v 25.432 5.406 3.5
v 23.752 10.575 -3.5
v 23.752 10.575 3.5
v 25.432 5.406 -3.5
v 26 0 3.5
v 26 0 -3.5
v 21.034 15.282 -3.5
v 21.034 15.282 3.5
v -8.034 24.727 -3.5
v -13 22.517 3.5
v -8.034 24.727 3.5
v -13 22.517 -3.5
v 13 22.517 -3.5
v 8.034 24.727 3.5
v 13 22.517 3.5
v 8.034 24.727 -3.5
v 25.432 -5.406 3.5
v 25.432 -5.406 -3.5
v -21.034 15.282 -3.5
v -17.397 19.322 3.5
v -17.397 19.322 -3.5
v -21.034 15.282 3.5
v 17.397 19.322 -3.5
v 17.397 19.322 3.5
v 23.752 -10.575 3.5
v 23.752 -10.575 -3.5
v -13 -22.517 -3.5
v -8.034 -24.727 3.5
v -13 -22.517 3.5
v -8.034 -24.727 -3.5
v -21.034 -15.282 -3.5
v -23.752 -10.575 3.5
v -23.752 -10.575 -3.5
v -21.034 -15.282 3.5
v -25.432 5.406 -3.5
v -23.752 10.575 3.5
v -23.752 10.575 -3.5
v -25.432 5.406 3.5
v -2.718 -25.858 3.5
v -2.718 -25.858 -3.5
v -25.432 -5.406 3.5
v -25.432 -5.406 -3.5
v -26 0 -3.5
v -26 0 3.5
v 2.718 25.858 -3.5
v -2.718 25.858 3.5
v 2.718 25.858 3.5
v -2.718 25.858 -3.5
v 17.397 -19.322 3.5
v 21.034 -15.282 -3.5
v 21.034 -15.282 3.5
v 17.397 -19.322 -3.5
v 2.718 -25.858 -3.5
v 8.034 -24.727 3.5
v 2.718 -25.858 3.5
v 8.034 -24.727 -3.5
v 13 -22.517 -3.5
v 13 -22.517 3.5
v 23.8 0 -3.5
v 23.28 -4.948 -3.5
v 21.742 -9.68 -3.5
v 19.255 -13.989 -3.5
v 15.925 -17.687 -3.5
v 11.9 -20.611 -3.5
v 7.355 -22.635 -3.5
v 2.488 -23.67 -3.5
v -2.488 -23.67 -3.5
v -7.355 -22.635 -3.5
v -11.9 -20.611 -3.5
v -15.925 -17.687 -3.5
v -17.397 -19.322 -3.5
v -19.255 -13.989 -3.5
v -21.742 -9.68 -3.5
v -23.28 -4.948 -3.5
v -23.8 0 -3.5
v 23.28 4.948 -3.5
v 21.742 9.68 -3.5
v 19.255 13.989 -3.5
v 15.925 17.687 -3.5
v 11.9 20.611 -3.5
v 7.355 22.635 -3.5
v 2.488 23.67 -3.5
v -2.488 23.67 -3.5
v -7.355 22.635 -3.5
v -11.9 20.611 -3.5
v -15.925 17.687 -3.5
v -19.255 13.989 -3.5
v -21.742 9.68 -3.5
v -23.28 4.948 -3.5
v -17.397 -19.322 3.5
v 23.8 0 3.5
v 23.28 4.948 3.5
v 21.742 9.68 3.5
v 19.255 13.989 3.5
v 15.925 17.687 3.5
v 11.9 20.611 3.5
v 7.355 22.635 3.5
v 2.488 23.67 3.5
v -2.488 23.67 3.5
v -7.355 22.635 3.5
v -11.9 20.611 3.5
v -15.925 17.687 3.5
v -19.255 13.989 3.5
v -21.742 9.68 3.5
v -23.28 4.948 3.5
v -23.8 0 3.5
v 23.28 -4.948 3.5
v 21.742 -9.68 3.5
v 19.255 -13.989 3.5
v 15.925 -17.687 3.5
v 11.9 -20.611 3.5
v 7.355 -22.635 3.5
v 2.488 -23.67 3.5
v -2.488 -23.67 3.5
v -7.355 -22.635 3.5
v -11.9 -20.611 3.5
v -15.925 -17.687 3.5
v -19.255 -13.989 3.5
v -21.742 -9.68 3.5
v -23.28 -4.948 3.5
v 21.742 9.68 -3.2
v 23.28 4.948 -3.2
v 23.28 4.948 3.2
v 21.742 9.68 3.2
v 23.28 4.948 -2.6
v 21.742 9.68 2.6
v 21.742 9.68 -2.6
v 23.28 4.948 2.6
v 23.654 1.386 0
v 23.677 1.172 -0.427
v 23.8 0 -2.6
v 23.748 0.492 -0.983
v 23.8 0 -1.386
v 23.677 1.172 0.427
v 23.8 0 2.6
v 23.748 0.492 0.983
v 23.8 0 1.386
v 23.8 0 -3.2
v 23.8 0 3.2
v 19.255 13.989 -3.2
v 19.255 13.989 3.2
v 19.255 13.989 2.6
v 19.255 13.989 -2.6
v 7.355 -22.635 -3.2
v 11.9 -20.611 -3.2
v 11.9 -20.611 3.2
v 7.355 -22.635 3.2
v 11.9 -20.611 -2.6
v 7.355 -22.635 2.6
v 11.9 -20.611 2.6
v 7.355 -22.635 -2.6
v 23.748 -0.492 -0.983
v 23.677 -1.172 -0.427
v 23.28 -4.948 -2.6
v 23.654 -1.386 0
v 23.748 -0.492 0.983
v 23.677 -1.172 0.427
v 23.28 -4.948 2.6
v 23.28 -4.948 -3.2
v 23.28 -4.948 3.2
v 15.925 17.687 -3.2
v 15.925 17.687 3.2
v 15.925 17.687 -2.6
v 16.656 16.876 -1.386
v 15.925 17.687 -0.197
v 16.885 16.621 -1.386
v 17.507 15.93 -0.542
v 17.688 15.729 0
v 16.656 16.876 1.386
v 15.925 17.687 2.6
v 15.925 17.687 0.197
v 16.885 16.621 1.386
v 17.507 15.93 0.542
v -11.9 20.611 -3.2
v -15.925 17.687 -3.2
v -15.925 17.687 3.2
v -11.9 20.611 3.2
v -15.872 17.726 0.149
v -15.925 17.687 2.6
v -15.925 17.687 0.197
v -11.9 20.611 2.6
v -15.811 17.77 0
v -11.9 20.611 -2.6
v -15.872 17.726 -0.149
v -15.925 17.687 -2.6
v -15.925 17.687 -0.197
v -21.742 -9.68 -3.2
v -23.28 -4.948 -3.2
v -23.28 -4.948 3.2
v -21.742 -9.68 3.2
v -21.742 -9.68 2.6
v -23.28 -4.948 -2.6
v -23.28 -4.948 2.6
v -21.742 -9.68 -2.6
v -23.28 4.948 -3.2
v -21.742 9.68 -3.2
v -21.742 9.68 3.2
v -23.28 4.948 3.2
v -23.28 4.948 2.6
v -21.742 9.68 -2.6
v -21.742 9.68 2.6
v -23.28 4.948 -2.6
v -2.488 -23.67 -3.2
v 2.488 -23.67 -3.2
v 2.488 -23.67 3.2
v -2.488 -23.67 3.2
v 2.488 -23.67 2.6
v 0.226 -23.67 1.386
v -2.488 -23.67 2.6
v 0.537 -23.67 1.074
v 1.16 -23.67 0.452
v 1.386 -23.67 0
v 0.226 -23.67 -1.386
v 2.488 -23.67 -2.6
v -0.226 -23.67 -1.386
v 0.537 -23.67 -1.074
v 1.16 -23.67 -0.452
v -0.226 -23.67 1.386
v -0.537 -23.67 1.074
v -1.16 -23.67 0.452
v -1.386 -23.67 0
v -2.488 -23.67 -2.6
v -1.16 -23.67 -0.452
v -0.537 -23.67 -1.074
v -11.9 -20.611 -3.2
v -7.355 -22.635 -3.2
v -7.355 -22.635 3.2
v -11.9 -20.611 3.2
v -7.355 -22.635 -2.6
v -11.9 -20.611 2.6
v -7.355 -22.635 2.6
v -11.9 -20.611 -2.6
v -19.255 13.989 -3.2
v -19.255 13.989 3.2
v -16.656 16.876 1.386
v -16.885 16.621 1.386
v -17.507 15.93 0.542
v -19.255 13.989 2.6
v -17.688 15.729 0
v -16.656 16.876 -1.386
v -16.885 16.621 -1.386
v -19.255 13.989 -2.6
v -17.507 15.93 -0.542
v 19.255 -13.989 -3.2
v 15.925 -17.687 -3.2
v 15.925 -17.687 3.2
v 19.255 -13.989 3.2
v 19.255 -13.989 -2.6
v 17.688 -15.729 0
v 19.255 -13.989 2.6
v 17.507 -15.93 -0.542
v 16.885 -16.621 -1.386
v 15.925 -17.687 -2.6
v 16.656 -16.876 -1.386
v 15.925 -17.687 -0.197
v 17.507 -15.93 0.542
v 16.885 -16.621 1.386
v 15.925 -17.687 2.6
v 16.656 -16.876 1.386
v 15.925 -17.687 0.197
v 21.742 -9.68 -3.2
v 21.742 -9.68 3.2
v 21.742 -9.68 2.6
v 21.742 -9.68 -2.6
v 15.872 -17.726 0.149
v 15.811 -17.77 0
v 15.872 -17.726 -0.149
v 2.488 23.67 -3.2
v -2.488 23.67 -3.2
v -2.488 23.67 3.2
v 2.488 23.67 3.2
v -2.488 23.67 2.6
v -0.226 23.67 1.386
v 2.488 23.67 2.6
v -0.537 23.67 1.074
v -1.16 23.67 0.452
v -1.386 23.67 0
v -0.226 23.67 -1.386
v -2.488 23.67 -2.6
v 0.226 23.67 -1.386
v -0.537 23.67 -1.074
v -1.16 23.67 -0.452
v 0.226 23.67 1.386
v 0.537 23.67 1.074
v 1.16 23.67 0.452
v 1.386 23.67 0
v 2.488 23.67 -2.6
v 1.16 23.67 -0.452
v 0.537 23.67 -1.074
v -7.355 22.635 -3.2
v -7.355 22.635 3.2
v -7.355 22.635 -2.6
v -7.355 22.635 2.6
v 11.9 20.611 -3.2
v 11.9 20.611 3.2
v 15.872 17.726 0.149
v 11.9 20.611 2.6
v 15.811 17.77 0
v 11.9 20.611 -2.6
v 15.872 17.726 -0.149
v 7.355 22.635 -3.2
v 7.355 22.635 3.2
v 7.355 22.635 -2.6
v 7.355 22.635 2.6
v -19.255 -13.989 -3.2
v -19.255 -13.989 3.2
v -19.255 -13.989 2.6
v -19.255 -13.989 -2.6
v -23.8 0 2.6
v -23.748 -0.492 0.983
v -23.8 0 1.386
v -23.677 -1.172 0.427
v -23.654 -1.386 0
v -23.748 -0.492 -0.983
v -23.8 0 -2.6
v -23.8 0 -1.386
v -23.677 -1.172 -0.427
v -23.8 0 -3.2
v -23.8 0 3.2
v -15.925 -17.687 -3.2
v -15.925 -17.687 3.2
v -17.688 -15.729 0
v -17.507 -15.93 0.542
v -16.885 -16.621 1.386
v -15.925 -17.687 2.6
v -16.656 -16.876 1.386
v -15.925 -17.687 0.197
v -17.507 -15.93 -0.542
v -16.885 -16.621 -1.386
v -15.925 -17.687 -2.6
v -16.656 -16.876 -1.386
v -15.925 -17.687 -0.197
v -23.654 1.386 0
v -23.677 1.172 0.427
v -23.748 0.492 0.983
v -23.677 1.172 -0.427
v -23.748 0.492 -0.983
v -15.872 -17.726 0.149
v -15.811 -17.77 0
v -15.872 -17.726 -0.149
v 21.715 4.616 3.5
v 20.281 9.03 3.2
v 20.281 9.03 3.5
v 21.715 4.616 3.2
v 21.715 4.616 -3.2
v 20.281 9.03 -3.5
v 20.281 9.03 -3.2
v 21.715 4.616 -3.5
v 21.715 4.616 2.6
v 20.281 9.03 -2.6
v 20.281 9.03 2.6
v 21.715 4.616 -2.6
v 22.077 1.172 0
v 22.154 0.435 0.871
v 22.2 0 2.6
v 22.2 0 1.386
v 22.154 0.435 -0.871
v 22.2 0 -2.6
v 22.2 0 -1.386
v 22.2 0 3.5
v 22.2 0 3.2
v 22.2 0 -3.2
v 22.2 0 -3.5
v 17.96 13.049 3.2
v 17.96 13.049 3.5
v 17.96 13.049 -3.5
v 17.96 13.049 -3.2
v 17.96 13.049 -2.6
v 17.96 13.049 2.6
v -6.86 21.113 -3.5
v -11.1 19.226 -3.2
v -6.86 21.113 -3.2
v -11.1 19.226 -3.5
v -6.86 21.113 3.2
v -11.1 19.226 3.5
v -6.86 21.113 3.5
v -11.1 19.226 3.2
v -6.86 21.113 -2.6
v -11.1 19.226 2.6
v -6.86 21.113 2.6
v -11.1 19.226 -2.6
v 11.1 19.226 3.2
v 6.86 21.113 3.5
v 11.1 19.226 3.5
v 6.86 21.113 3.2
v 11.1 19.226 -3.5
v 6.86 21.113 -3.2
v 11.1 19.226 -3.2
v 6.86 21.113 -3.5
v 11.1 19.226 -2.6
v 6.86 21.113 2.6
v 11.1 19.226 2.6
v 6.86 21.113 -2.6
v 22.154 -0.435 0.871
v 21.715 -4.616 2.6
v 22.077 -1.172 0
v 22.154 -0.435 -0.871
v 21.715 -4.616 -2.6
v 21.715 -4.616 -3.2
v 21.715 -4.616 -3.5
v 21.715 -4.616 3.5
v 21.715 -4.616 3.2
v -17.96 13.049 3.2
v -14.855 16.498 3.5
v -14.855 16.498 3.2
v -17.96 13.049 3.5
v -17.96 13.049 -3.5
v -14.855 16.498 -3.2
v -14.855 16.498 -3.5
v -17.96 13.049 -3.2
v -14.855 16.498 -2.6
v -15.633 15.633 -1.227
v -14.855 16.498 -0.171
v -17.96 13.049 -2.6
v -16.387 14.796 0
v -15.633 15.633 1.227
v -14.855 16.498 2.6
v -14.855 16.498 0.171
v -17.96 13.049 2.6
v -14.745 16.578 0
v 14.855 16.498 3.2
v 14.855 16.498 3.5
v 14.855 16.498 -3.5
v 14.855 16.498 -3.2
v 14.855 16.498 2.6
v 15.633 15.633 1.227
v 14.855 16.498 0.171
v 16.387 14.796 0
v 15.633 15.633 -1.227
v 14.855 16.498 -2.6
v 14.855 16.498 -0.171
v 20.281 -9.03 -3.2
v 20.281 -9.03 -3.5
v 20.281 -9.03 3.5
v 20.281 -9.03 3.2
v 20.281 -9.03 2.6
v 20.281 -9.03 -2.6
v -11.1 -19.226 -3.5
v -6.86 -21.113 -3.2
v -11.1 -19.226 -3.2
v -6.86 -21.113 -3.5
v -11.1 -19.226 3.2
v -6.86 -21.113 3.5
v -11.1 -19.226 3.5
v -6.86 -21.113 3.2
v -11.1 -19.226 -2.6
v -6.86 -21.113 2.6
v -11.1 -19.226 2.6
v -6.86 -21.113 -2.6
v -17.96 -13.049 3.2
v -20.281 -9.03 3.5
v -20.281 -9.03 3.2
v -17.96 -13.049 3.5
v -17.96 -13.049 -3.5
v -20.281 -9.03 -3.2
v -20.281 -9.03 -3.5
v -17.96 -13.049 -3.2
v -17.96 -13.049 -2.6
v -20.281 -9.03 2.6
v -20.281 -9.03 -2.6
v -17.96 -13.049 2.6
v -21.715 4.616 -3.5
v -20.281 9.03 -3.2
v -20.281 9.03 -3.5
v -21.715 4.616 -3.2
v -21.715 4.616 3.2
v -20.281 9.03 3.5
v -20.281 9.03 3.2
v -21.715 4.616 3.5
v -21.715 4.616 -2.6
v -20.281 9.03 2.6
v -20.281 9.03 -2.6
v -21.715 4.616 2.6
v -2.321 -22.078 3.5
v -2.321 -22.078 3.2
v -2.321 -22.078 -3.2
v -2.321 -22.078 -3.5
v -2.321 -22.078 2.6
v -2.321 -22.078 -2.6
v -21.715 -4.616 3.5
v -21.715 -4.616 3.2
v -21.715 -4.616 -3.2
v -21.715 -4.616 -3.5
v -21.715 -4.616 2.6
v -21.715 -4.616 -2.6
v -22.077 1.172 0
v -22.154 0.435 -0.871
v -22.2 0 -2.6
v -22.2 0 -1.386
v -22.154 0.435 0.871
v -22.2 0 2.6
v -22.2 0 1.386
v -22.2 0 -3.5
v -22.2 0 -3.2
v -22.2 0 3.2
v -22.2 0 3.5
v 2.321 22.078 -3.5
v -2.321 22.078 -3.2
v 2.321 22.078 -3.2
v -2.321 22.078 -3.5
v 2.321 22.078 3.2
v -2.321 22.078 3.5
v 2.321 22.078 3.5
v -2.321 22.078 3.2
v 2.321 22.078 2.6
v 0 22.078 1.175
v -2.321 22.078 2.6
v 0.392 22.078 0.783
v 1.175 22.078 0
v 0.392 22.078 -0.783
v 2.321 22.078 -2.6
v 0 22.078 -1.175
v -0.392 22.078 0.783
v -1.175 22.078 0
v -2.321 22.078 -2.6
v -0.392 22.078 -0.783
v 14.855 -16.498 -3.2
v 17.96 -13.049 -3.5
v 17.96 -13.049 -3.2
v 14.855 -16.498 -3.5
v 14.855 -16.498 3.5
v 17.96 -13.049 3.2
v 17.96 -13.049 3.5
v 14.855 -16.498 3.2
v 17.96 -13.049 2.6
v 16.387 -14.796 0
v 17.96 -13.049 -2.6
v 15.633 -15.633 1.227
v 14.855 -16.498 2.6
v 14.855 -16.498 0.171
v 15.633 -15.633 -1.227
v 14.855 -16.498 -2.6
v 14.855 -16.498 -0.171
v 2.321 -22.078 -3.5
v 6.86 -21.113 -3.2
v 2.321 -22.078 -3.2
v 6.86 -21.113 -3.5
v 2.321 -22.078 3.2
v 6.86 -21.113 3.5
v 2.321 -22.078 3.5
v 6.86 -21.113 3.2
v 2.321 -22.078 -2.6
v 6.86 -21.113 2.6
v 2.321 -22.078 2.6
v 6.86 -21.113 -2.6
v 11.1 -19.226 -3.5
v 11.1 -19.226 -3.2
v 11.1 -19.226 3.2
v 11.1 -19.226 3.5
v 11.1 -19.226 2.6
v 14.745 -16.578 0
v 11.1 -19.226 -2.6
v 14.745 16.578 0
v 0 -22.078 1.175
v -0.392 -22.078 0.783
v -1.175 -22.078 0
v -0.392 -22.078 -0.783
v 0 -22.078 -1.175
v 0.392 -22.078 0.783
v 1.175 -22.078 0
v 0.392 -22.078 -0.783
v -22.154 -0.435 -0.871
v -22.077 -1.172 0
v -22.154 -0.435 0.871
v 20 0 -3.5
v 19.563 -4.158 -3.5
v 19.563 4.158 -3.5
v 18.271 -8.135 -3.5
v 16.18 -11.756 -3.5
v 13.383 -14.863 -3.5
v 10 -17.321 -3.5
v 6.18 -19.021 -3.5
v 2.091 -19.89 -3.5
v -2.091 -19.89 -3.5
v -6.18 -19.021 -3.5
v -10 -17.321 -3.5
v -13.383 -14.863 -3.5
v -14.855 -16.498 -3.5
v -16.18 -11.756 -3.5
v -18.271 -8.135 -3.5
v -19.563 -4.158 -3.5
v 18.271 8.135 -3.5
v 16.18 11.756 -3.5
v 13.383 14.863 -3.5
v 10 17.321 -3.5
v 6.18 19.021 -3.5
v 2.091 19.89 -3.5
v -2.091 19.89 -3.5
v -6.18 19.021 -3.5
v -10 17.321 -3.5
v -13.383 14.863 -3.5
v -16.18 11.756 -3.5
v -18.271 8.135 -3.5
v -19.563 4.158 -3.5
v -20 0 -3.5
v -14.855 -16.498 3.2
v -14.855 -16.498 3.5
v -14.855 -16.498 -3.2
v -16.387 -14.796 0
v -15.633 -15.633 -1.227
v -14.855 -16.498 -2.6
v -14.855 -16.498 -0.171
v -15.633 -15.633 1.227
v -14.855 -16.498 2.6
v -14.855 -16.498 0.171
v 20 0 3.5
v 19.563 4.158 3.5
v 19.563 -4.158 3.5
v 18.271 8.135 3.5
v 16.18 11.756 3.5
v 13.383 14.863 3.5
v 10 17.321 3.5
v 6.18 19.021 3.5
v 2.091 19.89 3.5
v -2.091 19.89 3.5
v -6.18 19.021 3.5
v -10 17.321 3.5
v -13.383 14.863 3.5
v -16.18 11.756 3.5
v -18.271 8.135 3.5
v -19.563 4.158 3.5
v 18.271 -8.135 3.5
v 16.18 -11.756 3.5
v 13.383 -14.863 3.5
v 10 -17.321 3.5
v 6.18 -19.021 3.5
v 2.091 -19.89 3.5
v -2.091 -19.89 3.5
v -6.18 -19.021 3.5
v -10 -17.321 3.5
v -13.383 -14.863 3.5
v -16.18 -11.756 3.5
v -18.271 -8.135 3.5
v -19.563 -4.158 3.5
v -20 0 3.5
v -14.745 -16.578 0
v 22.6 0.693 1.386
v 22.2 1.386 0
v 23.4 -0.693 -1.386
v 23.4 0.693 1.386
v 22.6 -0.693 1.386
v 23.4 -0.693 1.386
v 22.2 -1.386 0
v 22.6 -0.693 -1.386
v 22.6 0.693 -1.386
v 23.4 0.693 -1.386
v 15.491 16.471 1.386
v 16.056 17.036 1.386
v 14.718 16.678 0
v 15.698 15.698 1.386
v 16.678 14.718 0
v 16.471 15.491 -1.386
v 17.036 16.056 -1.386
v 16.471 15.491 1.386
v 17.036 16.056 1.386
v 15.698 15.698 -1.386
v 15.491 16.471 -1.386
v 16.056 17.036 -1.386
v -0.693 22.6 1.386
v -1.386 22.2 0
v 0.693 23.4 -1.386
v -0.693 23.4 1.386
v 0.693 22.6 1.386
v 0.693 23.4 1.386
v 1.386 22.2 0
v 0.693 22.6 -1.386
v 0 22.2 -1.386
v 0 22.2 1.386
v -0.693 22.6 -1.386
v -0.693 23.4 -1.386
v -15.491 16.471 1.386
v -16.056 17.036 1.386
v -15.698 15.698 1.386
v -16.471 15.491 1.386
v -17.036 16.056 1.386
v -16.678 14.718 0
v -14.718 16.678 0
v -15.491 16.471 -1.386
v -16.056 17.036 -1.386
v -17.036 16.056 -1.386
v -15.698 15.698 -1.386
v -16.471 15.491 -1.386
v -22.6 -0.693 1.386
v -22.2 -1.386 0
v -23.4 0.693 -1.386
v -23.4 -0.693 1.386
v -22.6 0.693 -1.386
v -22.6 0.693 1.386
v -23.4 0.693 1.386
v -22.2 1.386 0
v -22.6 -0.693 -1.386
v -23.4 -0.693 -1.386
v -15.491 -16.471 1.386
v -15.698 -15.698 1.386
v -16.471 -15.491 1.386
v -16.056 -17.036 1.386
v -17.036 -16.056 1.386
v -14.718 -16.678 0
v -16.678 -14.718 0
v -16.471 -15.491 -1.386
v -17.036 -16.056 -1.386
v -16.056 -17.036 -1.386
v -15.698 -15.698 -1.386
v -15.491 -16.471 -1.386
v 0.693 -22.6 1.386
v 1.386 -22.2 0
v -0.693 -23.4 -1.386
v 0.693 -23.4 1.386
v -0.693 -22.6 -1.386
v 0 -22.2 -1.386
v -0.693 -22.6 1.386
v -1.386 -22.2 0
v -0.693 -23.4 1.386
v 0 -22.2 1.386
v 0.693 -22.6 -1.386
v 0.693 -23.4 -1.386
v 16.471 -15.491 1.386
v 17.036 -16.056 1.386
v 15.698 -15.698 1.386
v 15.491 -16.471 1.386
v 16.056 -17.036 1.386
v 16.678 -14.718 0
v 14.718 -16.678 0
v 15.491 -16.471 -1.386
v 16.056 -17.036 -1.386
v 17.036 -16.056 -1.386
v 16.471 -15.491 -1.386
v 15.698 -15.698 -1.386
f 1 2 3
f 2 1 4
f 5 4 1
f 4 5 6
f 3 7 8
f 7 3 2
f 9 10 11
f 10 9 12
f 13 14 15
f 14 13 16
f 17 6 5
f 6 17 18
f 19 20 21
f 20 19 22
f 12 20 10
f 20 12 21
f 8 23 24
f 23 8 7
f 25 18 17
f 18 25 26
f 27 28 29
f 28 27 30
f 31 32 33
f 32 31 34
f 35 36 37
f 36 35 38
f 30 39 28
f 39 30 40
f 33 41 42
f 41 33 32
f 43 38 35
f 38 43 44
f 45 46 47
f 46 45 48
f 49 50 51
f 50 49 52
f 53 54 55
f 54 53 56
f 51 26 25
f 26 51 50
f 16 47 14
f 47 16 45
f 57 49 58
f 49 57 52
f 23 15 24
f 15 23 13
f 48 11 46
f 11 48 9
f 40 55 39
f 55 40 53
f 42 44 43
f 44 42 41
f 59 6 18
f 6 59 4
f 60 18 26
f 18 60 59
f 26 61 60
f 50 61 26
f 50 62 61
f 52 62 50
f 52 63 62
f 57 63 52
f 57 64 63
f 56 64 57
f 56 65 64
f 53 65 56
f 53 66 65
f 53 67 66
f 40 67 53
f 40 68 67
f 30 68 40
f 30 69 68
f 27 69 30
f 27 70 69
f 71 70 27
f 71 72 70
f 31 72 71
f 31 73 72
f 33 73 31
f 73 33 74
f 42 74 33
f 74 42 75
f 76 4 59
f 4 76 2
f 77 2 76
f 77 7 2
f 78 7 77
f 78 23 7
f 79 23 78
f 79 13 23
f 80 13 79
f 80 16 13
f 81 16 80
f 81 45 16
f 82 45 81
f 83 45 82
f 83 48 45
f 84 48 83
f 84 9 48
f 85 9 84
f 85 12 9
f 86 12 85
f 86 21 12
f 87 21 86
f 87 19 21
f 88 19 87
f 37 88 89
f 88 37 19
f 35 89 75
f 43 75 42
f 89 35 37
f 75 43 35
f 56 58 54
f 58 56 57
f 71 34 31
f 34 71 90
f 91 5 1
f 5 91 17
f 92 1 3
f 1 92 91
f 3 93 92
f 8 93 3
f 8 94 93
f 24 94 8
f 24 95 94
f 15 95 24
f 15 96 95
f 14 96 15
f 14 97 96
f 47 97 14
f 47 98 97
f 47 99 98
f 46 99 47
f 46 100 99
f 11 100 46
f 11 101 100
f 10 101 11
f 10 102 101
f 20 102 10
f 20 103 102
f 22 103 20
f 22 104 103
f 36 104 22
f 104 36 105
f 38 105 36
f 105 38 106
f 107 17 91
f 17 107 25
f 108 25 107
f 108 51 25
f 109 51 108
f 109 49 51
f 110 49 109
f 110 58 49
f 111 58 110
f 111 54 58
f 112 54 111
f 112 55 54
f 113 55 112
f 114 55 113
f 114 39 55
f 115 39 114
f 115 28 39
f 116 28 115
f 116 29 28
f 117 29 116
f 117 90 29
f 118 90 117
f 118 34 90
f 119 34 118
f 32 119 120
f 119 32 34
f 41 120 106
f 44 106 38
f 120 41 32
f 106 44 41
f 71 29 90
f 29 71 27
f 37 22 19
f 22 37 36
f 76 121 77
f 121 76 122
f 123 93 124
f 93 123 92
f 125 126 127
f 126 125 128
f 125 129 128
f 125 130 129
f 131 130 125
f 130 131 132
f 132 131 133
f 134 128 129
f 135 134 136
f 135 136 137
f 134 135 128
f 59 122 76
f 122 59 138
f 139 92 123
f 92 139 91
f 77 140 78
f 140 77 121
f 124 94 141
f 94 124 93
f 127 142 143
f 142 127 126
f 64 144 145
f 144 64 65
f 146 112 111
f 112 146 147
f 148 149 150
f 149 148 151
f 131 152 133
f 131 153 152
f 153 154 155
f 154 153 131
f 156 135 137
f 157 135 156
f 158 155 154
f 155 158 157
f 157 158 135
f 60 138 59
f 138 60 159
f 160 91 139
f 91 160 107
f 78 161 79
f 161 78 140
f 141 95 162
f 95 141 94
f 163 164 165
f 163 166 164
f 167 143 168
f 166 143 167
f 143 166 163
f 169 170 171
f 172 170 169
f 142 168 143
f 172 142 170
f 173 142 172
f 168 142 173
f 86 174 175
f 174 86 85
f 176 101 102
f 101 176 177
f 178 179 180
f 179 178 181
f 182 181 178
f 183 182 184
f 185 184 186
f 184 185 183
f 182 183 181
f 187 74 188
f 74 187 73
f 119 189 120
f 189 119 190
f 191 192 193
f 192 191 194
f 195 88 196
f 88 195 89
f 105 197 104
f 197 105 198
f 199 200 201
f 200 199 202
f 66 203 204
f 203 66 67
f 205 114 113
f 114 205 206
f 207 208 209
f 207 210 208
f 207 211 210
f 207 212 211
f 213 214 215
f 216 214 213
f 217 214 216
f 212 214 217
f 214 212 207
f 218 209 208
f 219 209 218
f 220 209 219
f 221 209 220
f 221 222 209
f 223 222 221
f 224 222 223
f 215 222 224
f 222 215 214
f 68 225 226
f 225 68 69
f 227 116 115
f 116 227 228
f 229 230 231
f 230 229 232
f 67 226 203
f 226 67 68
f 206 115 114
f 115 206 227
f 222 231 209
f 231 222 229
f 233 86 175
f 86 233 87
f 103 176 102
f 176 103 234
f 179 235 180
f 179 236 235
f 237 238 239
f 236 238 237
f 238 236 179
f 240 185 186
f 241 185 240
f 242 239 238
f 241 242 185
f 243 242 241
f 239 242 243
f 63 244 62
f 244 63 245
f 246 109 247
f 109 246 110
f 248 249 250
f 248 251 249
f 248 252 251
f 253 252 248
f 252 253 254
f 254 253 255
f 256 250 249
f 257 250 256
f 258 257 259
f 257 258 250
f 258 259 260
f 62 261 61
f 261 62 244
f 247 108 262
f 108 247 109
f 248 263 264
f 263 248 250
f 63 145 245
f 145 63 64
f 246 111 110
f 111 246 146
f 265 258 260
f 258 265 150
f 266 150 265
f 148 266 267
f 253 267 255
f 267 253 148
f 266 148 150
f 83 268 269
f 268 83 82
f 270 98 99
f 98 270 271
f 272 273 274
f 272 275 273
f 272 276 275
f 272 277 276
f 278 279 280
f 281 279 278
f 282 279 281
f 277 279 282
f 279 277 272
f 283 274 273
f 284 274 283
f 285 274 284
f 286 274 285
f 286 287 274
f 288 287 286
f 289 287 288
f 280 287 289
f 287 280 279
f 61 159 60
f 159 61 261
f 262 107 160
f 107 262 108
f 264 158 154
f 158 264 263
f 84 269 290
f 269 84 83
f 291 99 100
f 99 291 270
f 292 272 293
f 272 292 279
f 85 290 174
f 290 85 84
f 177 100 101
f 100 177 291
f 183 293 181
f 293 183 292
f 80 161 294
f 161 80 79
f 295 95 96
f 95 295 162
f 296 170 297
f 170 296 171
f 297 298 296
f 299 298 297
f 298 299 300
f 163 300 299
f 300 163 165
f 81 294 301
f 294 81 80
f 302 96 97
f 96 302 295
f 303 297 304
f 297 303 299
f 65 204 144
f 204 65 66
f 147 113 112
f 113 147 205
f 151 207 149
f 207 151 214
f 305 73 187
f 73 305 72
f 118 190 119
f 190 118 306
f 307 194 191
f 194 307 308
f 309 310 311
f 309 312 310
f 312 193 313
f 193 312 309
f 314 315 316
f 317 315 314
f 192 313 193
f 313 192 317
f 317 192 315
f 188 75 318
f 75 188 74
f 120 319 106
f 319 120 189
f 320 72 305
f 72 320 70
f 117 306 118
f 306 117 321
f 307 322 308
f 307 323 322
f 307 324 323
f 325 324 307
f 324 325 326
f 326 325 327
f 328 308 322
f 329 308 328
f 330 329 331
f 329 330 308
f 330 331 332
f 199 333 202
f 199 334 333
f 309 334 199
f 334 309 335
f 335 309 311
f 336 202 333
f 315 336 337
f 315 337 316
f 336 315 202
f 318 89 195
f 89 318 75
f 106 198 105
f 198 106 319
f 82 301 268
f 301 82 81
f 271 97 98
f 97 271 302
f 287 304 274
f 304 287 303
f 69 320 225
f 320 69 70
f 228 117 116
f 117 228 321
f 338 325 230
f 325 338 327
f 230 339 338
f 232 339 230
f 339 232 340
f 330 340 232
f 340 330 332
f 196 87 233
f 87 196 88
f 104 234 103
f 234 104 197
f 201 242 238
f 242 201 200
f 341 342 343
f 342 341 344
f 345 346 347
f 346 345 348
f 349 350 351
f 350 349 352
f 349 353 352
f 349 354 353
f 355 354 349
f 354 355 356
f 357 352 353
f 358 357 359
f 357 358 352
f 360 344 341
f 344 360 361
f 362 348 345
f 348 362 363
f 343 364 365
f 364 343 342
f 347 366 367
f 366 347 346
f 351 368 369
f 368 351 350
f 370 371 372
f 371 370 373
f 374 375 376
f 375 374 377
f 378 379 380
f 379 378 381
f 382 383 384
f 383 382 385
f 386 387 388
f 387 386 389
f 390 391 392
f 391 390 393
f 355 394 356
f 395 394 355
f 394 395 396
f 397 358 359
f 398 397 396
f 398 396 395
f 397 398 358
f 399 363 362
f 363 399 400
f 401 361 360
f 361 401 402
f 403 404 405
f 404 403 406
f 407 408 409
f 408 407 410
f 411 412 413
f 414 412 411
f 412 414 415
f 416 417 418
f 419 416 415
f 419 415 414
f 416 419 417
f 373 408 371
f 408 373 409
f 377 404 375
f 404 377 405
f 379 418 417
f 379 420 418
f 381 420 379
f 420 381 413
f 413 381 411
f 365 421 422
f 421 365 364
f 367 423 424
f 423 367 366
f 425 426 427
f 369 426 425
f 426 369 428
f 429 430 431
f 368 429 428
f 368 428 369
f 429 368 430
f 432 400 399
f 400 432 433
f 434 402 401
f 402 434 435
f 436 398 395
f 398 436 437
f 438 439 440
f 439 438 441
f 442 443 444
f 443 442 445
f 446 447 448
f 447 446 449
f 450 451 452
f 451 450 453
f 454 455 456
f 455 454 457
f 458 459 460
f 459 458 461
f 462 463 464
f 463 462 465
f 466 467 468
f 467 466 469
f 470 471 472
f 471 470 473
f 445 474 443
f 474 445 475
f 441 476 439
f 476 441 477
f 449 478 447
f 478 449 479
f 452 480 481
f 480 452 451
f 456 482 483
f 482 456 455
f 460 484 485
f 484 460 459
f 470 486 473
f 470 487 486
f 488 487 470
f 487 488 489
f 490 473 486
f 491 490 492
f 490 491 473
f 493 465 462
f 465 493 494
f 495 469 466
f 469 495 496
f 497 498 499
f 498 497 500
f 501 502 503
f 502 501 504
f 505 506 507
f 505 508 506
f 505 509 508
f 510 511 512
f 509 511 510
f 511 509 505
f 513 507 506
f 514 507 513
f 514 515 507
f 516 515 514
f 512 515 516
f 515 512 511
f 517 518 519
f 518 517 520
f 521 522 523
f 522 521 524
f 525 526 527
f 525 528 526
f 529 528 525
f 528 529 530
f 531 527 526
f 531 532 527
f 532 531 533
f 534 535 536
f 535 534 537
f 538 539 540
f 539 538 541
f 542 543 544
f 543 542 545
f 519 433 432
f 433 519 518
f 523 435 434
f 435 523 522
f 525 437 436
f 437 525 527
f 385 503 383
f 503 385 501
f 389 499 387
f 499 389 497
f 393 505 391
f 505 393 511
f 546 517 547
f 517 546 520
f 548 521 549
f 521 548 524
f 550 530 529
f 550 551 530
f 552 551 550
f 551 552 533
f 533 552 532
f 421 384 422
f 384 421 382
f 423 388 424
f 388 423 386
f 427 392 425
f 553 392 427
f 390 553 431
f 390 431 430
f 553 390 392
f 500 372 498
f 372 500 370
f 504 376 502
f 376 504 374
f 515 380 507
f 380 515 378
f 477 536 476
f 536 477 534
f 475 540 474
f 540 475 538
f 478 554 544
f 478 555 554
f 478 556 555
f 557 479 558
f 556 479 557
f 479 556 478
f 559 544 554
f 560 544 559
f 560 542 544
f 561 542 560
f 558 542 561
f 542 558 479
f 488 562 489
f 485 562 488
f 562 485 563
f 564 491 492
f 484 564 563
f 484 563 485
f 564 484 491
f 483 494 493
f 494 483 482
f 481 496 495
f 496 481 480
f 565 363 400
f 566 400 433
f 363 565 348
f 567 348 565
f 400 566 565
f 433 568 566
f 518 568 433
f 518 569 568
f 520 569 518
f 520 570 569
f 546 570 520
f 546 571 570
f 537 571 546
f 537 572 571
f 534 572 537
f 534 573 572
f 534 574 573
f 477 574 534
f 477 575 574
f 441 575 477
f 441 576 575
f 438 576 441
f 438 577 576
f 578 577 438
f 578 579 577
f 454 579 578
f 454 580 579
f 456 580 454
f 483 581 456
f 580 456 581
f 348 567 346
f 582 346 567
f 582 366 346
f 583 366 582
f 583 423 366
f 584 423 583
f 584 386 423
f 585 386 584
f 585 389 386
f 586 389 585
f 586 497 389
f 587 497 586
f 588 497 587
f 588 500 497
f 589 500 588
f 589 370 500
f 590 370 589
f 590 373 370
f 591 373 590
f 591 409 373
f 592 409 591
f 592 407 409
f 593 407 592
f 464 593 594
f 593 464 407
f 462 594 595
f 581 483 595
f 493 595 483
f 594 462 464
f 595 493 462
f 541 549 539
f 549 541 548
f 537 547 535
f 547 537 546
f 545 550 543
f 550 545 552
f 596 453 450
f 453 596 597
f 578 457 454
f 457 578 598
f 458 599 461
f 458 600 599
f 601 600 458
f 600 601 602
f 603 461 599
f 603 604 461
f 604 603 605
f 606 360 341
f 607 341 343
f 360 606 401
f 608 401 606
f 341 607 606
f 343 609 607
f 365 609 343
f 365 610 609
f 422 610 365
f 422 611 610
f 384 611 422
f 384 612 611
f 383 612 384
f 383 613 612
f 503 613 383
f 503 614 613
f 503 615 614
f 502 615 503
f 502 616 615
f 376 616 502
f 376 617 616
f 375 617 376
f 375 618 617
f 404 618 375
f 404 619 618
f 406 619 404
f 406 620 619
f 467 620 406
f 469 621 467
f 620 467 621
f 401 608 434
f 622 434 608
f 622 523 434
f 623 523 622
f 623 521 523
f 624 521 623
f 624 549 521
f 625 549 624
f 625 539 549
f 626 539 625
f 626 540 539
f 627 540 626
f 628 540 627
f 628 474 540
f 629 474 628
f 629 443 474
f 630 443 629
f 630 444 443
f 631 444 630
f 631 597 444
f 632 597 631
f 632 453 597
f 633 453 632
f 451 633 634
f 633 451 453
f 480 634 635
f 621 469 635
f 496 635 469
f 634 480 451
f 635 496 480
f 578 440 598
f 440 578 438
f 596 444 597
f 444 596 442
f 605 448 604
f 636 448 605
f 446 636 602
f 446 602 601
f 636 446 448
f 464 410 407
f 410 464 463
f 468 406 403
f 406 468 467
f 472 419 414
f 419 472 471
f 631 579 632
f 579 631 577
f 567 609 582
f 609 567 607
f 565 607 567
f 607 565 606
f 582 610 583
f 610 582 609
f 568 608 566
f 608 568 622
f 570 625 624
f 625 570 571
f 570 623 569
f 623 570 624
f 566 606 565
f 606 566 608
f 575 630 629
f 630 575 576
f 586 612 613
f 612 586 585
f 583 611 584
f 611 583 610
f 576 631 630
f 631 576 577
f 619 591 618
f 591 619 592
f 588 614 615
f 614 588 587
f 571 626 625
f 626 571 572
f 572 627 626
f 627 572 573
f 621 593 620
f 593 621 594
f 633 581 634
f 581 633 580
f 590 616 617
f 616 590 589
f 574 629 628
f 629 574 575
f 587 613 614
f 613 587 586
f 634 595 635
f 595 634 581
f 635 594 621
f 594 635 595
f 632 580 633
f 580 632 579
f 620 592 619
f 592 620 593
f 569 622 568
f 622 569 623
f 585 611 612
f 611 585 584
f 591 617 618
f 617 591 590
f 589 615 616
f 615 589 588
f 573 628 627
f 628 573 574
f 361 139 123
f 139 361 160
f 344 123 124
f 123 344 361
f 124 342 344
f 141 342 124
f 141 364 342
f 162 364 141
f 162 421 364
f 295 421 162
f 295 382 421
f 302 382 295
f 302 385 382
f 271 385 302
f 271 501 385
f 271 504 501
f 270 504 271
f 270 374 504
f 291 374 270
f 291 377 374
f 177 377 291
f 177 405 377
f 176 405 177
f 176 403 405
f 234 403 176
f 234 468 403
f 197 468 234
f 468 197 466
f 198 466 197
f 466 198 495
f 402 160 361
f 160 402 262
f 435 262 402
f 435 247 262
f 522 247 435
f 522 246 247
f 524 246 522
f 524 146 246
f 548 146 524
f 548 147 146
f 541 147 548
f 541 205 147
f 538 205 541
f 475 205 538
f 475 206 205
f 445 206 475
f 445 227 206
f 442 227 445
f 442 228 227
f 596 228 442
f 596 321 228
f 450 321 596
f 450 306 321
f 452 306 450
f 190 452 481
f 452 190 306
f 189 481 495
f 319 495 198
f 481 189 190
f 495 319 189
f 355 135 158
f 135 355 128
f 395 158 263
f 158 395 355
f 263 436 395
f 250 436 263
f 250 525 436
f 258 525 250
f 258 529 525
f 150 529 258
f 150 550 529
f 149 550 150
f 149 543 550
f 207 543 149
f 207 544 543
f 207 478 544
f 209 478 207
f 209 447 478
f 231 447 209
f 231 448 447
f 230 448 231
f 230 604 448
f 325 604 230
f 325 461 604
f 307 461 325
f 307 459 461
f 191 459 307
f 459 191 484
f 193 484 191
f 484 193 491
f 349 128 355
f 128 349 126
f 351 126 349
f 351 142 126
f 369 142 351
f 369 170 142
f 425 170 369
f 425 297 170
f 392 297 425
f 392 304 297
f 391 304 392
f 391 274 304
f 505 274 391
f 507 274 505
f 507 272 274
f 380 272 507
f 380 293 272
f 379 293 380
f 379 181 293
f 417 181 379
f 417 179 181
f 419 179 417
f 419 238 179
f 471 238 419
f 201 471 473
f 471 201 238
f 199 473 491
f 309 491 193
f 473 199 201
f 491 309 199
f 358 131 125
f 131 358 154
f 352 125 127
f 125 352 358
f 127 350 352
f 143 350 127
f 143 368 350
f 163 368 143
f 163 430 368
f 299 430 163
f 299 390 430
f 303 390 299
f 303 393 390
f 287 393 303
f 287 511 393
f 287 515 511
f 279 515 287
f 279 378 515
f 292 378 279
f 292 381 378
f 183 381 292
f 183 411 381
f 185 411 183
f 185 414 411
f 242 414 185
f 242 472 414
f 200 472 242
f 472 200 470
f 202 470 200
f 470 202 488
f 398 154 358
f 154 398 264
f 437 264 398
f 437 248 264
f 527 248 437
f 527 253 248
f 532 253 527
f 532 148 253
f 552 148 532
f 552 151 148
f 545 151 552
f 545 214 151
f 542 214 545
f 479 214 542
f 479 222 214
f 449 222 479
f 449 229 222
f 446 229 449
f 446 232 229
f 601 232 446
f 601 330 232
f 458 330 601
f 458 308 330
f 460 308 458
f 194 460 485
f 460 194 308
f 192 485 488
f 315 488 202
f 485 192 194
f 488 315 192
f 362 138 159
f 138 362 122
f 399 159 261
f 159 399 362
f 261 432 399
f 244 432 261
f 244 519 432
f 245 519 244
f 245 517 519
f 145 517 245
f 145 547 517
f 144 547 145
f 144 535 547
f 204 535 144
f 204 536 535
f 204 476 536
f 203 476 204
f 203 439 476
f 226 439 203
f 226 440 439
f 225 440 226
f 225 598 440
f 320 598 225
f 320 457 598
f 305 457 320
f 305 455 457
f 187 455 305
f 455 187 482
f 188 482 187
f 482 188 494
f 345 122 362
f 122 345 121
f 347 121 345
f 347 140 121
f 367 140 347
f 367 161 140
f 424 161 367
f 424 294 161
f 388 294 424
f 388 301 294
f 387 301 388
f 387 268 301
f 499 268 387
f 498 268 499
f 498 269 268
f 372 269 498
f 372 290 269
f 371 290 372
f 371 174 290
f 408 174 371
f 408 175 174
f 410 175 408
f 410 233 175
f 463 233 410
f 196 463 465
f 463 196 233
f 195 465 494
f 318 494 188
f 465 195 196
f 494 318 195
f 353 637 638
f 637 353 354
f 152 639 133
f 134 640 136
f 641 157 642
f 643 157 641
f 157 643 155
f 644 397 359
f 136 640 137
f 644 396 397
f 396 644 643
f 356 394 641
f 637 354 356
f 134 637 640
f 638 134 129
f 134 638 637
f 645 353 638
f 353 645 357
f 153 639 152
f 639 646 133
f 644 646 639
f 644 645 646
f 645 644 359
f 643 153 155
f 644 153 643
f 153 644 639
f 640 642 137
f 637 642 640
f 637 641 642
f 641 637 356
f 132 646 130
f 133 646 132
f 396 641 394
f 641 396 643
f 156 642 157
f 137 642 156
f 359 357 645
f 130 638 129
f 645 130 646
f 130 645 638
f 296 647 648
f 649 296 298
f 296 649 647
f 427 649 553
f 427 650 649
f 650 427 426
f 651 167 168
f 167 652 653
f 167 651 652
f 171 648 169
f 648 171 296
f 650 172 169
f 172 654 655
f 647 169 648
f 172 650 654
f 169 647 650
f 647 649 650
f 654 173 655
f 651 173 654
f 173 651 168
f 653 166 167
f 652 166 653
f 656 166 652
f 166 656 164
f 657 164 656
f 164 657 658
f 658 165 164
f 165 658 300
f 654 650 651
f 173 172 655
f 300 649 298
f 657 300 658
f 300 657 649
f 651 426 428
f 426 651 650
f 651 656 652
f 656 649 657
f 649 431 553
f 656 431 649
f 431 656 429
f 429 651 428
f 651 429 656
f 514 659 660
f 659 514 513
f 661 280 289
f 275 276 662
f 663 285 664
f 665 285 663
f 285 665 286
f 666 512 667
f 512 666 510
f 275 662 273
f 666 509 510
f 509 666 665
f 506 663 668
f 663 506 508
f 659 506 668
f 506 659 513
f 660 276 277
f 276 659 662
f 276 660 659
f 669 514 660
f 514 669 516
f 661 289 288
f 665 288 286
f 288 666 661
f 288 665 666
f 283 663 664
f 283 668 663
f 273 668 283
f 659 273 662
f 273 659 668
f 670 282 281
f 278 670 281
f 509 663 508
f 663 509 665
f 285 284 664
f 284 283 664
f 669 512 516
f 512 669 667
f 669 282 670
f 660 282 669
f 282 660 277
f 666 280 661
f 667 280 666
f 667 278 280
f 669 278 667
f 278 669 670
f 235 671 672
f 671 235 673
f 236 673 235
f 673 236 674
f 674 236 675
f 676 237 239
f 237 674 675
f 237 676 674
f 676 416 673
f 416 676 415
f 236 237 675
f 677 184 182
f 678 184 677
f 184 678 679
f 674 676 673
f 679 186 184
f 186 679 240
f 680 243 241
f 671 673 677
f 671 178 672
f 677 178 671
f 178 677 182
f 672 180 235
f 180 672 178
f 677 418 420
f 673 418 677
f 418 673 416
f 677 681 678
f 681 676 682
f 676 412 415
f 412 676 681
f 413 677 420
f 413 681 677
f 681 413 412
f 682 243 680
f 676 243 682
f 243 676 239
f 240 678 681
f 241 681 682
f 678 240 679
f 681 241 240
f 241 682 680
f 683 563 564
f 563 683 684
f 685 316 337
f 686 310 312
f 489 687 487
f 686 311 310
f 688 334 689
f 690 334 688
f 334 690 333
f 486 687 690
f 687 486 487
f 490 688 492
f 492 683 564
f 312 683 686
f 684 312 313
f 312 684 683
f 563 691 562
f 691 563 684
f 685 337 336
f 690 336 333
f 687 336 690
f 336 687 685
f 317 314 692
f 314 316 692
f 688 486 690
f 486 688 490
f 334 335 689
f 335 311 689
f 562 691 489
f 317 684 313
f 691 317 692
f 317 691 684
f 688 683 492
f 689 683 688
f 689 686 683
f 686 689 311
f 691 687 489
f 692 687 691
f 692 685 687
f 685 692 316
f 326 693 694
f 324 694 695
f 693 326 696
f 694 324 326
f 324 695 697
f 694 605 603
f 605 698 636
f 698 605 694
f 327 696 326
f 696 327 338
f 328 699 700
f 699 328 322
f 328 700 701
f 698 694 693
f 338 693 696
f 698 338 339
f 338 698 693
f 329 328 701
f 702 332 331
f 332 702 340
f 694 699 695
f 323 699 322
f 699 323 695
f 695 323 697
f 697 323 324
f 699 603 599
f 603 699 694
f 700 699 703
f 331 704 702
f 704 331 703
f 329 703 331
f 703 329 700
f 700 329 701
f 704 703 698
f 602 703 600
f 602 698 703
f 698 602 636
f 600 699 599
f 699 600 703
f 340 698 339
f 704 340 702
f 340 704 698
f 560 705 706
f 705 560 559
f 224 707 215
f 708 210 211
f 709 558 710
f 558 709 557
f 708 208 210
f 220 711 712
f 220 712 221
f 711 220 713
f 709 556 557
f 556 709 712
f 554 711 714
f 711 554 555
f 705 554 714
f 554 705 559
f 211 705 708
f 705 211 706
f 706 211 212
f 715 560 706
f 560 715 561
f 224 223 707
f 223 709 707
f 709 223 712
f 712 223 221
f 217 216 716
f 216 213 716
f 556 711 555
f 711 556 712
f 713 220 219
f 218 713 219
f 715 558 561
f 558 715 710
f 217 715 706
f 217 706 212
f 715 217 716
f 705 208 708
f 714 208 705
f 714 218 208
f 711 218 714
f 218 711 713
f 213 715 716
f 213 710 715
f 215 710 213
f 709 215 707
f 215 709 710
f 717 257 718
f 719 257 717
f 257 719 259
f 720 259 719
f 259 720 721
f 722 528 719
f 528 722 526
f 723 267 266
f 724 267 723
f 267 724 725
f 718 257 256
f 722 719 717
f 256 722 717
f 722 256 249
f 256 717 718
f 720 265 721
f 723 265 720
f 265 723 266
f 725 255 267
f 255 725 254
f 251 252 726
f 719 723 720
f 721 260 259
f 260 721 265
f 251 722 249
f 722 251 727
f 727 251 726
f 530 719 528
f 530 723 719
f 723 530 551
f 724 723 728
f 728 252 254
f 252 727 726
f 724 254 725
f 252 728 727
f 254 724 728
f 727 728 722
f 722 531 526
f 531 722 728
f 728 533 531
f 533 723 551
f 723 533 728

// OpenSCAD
// Parameters
bore_diameter_mm = 40; //[20:80:0.5]
outer_diameter_mm = 52; //[26:104:0.5]
width_mm = 7; //[3.5:14:0.1]
eps_mm = 0.6; //[0.2:2:0.1]
outer_ring_radial_thickness_mm = 2.2; //[1.2:4.4:0.1]
inner_ring_radial_thickness_mm = 2.2; //[1.2:4.4:0.1]
shield_thickness_mm = 0.6; //[0.3:1.5:0.1]
shield_radial_overlap_mm = 1.2; //[0.5:3:0.1]
ball_diameter_mm = 3.2; //[1.5:6.5:0.1]
ball_count = 8; //[6:14:1]

// Outer Ring
module outer_ring() {
  color("DimGray") difference() {
    cylinder(r=outer_diameter_mm/2, h=width_mm, center=true);
    cylinder(r=outer_diameter_mm/2 - outer_ring_radial_thickness_mm, h=width_mm + 2*eps_mm, center=true);
  }
}

// Inner Ring
module inner_ring() {
  color("DimGray") difference() {
    cylinder(r=bore_diameter_mm/2 + inner_ring_radial_thickness_mm, h=width_mm, center=true);
    cylinder(r=bore_diameter_mm/2, h=width_mm + 2*eps_mm, center=true);
  }
}

// Shield
module shield() {
  color("Silver") union() {
    difference() {
      translate([0, 0, width_mm/2 - shield_thickness_mm/2 - eps_mm/2])
        cylinder(r=outer_diameter_mm/2 - outer_ring_radial_thickness_mm + shield_radial_overlap_mm, h=shield_thickness_mm, center=true);
      translate([0, 0, width_mm/2 - shield_thickness_mm/2 - eps_mm/2])
        cylinder(r=bore_diameter_mm/2 + inner_ring_radial_thickness_mm - shield_radial_overlap_mm, h=shield_thickness_mm + 2*eps_mm, center=true);
    }
    difference() {
      translate([0, 0, -width_mm/2 + shield_thickness_mm/2 + eps_mm/2])
        cylinder(r=outer_diameter_mm/2 - outer_ring_radial_thickness_mm + shield_radial_overlap_mm, h=shield_thickness_mm, center=true);
      translate([0, 0, -width_mm/2 + shield_thickness_mm/2 + eps_mm/2])
        cylinder(r=bore_diameter_mm/2 + inner_ring_radial_thickness_mm - shield_radial_overlap_mm, h=shield_thickness_mm + 2*eps_mm, center=true);
    }
  }
}

// Bearing Ball
module bearing_ball() {
  color("Silver") {
    for (i = [0:ball_count-1]) {
      rotate([0, 0, i*360/ball_count])
        translate([(bore_diameter_mm/2 + inner_ring_radial_thickness_mm + (outer_diameter_mm/2 - outer_ring_radial_thickness_mm))/2, 0, 0])
        sphere(r=ball_diameter_mm/2, center=true);
    }
  }
}

// Ball Bearing Assembly
module ball_bearing() {
  union() {
    outer_ring();
    inner_ring();
    shield();
    bearing_ball();
  }
}

// Final Assembly
module assembly() {
  ball_bearing();
}

assembly();
